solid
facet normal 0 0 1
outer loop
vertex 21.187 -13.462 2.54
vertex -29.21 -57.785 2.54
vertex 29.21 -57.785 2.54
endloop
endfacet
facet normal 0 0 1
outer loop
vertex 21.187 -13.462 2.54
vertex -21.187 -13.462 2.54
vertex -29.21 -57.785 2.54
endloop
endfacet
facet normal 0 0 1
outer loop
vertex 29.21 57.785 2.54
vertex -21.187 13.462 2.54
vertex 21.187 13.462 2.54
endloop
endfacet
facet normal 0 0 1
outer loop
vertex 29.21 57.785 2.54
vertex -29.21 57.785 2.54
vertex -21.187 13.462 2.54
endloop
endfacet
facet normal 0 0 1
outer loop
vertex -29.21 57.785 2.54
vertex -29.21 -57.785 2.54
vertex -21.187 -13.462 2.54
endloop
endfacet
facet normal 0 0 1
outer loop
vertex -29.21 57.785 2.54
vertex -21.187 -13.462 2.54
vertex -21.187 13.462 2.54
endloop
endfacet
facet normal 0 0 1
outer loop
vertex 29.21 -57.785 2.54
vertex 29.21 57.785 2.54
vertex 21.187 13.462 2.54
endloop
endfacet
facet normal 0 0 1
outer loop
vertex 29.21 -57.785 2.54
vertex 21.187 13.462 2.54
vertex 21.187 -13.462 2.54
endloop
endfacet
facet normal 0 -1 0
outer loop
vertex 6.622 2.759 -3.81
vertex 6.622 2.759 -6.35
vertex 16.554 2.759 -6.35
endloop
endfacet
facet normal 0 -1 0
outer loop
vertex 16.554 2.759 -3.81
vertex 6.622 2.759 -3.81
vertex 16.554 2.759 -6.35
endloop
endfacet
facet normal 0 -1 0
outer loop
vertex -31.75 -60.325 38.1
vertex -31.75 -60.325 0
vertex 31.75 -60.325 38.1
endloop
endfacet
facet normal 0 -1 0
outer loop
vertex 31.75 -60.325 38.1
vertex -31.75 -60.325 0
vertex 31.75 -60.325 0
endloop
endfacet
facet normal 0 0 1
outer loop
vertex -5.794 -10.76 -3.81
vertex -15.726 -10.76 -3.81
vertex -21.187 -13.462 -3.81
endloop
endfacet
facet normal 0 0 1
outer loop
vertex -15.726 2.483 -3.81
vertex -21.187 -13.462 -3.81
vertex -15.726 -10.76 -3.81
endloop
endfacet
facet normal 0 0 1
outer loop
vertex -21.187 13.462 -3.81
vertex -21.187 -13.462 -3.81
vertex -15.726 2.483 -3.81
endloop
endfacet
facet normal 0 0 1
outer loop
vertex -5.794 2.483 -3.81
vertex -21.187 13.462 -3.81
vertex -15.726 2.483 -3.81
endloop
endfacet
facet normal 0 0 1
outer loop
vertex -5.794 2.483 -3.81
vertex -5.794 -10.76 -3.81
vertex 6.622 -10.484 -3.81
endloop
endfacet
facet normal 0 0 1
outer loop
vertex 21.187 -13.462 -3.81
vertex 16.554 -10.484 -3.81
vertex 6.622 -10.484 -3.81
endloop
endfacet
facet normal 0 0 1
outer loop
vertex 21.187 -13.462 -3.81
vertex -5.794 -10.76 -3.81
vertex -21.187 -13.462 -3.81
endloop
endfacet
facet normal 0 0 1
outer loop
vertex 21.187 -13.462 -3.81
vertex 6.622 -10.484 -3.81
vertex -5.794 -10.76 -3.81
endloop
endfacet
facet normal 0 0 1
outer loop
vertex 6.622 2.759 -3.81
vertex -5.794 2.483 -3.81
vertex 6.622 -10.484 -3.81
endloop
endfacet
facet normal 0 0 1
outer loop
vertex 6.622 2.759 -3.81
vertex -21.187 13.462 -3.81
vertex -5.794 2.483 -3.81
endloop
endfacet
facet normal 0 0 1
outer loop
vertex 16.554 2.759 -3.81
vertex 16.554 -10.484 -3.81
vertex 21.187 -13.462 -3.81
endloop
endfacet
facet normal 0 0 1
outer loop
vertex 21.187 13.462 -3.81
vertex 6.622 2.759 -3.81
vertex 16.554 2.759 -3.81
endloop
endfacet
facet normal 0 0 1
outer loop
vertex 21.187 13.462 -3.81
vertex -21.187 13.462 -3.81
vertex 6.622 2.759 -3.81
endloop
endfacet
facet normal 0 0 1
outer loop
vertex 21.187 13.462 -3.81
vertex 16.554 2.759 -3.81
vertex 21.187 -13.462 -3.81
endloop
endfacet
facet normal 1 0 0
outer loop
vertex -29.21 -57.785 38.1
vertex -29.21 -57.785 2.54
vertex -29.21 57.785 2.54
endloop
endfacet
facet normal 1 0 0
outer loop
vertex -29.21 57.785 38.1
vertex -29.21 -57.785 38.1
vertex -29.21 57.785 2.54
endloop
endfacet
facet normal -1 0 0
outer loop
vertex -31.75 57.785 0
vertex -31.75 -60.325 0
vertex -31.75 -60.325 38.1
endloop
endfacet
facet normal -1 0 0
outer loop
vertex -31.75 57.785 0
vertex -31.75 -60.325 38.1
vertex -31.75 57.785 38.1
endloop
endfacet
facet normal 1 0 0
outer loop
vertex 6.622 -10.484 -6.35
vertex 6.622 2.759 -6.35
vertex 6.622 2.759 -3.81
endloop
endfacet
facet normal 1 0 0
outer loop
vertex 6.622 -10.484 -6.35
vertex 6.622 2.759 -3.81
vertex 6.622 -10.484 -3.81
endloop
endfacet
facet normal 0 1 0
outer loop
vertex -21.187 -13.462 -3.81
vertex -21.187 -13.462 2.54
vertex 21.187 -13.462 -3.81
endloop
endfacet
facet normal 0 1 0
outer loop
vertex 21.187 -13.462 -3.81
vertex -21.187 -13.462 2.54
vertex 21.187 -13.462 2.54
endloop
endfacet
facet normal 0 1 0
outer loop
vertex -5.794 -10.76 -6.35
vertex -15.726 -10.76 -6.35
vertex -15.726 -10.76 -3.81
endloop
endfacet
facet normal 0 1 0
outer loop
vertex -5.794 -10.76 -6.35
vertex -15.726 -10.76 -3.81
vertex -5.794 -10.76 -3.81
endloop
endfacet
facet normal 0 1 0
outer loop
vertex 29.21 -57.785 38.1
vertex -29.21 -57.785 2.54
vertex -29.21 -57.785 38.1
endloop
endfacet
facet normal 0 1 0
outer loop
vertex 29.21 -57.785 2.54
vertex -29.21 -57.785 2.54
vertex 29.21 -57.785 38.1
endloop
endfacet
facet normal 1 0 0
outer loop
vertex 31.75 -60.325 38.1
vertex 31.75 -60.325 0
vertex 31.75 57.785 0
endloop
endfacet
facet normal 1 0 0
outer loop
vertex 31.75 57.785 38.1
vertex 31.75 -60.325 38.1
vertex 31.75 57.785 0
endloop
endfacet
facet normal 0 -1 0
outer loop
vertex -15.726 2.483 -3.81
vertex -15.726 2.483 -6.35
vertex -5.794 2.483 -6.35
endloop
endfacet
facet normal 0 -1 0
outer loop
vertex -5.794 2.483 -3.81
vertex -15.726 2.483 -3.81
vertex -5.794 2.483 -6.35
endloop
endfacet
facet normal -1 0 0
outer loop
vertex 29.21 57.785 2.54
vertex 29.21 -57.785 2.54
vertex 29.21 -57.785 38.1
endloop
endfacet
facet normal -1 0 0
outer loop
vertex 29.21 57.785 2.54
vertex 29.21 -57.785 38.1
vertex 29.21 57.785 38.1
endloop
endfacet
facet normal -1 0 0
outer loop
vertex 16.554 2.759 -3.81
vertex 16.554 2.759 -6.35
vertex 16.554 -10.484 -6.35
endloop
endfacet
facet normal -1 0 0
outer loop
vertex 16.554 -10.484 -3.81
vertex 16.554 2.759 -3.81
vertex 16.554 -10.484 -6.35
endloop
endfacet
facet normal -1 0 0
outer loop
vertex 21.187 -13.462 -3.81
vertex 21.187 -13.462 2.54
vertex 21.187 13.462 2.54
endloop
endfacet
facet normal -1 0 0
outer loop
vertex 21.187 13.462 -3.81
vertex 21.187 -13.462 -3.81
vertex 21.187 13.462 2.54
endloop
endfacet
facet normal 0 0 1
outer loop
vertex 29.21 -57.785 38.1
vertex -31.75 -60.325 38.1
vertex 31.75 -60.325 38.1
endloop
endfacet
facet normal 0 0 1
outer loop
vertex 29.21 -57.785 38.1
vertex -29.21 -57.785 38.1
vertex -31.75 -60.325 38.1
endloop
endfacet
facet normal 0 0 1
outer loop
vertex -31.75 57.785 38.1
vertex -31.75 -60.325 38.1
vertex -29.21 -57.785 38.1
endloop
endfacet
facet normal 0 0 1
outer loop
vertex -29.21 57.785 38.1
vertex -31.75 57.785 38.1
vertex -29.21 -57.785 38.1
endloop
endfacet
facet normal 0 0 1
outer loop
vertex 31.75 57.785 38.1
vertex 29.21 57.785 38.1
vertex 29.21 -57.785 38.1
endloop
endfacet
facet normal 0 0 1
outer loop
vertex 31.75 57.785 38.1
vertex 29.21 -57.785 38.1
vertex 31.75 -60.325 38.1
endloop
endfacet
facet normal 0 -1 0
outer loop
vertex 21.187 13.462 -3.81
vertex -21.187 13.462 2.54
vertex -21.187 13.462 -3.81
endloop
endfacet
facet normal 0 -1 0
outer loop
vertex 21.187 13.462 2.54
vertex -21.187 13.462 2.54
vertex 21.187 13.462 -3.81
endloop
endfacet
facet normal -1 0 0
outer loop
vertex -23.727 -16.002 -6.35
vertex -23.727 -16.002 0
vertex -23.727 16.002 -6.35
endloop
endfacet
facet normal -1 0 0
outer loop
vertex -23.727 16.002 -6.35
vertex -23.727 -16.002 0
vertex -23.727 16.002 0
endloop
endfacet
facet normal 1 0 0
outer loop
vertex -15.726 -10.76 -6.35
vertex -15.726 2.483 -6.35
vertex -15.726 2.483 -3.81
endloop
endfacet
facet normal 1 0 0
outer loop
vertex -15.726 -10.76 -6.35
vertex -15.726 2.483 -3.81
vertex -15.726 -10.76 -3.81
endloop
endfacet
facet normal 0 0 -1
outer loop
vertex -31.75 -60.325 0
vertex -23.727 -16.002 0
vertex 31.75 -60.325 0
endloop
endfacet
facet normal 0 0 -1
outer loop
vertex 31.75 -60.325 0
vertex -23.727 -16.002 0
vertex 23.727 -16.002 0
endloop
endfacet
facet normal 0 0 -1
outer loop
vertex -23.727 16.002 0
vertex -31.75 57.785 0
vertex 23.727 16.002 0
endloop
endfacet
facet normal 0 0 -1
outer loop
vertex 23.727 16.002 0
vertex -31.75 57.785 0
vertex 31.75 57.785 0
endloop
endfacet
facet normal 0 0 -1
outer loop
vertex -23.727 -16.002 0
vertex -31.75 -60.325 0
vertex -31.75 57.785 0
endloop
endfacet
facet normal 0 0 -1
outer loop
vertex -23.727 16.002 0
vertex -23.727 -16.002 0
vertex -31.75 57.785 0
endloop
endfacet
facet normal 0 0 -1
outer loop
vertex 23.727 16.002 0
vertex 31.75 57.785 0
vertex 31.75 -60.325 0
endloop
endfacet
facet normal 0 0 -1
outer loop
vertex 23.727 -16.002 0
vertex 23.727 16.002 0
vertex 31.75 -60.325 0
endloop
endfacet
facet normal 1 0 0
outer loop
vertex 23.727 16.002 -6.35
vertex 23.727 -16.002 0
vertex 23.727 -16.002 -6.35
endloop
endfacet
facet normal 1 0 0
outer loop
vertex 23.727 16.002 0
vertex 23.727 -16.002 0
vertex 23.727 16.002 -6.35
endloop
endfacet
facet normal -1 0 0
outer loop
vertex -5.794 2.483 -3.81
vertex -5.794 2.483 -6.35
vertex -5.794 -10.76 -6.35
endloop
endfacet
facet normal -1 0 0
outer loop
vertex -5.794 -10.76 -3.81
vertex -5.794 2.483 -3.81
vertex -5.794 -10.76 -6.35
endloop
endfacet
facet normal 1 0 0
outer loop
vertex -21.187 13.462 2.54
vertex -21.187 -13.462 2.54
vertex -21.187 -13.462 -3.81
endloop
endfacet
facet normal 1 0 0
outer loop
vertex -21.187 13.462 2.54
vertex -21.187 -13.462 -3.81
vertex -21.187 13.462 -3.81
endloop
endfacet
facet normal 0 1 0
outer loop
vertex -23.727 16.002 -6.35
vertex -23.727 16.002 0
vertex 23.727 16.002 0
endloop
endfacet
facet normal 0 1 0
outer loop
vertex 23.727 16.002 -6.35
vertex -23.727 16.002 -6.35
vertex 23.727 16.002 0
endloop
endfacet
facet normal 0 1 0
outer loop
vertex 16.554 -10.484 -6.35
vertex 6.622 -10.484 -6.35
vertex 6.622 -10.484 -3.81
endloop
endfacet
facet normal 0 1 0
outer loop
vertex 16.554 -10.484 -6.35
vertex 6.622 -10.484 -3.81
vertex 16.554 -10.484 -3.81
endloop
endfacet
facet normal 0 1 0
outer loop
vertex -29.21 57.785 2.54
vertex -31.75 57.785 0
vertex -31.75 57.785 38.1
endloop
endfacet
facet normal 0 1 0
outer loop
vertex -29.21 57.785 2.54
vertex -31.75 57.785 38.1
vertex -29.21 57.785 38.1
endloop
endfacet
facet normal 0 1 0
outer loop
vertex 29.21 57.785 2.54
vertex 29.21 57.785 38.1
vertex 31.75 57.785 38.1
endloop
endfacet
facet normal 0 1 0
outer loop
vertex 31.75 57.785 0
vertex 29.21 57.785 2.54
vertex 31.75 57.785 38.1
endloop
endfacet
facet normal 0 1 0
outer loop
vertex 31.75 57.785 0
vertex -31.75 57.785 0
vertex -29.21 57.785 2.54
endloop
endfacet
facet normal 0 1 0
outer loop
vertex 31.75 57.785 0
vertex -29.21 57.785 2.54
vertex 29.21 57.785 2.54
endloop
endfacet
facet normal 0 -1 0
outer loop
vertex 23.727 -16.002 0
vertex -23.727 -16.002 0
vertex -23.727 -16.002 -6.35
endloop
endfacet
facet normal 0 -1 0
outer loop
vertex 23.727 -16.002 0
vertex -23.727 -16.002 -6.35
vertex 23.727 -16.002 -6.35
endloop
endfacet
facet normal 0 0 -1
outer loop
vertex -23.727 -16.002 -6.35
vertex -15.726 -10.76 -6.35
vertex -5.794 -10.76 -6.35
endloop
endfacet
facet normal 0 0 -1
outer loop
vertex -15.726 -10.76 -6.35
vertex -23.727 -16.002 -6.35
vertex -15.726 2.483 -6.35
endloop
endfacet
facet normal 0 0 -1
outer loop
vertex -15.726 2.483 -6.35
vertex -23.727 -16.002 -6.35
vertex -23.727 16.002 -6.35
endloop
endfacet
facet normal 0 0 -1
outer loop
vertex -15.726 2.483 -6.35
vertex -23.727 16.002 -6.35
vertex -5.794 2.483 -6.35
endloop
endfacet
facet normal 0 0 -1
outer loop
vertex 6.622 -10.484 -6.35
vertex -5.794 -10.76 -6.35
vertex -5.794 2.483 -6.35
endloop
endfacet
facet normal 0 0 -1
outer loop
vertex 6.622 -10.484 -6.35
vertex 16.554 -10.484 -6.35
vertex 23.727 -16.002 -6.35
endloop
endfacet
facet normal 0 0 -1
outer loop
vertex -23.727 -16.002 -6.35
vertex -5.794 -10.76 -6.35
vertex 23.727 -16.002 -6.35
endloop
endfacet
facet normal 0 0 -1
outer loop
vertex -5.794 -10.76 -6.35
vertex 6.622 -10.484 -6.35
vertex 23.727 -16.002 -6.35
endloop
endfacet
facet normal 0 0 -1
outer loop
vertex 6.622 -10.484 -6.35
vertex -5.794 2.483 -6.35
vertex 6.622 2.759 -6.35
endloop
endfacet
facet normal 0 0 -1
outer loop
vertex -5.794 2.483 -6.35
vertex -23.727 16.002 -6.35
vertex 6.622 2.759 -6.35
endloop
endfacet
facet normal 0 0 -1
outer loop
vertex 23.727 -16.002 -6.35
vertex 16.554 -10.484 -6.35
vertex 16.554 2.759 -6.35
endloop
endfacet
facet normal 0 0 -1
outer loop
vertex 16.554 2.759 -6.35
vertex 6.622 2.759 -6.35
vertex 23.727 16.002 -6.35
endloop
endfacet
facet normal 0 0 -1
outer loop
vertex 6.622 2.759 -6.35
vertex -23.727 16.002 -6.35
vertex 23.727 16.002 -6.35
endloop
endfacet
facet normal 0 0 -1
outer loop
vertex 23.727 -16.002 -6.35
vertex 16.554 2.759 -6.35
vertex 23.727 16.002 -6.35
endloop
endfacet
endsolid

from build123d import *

# Parameters (mm, degrees)
F1_W     = 47.4542081356
F1_H     = 32.0040024817
F2_DEPTH = 6.35
F0_W     = 63.5
F0_H     = 120.65
F3_DEPTH = 38.1
F4_T     = -2.54
F5_DEPTH = 2.54
F6_W     = 9.9322763272
F6_H     = 13.2430342492
F7_DEPTH = 44.451


with BuildPart() as f2:
    # F1 (on Top) → F2 (new body)
    with BuildSketch(Plane.XY):
        Rectangle(F1_W, F1_H)
    extrude(amount=-F2_DEPTH)

    # F0 (on Top) → F3 (join)
    with BuildSketch(Plane.XY):
        Rectangle(F0_W, F0_H)
    extrude(amount=F3_DEPTH)

    # F4
    f4_openings = [f2.faces().sort_by_distance(p)[0] for p in [
        (0, 0, 38.1),
    ]]
    offset(amount=F4_T, openings=f4_openings, kind=Kind.INTERSECTION)

    # F5 (cut): a face of the model
    f5_faces = [f2.faces().sort_by_distance(p)[0] for p in [
        (0, 60.325, 19.05),
    ]]
    extrude(f5_faces, amount=-F5_DEPTH, mode=Mode.SUBTRACT)

    # F6 (on face) → F7 (cut, through all)
    with BuildSketch(Plane(origin=(0, 0, -6.35), x_dir=(1, 0, 0), z_dir=(0, 0, -1))):
        with Locations((11.5876549389, 3.8625515299)):
            Rectangle(F6_W, F6_H)
        with Locations((-10.7599645853, 4.1384489741)):
            Rectangle(F6_W, F6_H)
    extrude(amount=-F7_DEPTH, mode=Mode.SUBTRACT)


solid = f2.part
